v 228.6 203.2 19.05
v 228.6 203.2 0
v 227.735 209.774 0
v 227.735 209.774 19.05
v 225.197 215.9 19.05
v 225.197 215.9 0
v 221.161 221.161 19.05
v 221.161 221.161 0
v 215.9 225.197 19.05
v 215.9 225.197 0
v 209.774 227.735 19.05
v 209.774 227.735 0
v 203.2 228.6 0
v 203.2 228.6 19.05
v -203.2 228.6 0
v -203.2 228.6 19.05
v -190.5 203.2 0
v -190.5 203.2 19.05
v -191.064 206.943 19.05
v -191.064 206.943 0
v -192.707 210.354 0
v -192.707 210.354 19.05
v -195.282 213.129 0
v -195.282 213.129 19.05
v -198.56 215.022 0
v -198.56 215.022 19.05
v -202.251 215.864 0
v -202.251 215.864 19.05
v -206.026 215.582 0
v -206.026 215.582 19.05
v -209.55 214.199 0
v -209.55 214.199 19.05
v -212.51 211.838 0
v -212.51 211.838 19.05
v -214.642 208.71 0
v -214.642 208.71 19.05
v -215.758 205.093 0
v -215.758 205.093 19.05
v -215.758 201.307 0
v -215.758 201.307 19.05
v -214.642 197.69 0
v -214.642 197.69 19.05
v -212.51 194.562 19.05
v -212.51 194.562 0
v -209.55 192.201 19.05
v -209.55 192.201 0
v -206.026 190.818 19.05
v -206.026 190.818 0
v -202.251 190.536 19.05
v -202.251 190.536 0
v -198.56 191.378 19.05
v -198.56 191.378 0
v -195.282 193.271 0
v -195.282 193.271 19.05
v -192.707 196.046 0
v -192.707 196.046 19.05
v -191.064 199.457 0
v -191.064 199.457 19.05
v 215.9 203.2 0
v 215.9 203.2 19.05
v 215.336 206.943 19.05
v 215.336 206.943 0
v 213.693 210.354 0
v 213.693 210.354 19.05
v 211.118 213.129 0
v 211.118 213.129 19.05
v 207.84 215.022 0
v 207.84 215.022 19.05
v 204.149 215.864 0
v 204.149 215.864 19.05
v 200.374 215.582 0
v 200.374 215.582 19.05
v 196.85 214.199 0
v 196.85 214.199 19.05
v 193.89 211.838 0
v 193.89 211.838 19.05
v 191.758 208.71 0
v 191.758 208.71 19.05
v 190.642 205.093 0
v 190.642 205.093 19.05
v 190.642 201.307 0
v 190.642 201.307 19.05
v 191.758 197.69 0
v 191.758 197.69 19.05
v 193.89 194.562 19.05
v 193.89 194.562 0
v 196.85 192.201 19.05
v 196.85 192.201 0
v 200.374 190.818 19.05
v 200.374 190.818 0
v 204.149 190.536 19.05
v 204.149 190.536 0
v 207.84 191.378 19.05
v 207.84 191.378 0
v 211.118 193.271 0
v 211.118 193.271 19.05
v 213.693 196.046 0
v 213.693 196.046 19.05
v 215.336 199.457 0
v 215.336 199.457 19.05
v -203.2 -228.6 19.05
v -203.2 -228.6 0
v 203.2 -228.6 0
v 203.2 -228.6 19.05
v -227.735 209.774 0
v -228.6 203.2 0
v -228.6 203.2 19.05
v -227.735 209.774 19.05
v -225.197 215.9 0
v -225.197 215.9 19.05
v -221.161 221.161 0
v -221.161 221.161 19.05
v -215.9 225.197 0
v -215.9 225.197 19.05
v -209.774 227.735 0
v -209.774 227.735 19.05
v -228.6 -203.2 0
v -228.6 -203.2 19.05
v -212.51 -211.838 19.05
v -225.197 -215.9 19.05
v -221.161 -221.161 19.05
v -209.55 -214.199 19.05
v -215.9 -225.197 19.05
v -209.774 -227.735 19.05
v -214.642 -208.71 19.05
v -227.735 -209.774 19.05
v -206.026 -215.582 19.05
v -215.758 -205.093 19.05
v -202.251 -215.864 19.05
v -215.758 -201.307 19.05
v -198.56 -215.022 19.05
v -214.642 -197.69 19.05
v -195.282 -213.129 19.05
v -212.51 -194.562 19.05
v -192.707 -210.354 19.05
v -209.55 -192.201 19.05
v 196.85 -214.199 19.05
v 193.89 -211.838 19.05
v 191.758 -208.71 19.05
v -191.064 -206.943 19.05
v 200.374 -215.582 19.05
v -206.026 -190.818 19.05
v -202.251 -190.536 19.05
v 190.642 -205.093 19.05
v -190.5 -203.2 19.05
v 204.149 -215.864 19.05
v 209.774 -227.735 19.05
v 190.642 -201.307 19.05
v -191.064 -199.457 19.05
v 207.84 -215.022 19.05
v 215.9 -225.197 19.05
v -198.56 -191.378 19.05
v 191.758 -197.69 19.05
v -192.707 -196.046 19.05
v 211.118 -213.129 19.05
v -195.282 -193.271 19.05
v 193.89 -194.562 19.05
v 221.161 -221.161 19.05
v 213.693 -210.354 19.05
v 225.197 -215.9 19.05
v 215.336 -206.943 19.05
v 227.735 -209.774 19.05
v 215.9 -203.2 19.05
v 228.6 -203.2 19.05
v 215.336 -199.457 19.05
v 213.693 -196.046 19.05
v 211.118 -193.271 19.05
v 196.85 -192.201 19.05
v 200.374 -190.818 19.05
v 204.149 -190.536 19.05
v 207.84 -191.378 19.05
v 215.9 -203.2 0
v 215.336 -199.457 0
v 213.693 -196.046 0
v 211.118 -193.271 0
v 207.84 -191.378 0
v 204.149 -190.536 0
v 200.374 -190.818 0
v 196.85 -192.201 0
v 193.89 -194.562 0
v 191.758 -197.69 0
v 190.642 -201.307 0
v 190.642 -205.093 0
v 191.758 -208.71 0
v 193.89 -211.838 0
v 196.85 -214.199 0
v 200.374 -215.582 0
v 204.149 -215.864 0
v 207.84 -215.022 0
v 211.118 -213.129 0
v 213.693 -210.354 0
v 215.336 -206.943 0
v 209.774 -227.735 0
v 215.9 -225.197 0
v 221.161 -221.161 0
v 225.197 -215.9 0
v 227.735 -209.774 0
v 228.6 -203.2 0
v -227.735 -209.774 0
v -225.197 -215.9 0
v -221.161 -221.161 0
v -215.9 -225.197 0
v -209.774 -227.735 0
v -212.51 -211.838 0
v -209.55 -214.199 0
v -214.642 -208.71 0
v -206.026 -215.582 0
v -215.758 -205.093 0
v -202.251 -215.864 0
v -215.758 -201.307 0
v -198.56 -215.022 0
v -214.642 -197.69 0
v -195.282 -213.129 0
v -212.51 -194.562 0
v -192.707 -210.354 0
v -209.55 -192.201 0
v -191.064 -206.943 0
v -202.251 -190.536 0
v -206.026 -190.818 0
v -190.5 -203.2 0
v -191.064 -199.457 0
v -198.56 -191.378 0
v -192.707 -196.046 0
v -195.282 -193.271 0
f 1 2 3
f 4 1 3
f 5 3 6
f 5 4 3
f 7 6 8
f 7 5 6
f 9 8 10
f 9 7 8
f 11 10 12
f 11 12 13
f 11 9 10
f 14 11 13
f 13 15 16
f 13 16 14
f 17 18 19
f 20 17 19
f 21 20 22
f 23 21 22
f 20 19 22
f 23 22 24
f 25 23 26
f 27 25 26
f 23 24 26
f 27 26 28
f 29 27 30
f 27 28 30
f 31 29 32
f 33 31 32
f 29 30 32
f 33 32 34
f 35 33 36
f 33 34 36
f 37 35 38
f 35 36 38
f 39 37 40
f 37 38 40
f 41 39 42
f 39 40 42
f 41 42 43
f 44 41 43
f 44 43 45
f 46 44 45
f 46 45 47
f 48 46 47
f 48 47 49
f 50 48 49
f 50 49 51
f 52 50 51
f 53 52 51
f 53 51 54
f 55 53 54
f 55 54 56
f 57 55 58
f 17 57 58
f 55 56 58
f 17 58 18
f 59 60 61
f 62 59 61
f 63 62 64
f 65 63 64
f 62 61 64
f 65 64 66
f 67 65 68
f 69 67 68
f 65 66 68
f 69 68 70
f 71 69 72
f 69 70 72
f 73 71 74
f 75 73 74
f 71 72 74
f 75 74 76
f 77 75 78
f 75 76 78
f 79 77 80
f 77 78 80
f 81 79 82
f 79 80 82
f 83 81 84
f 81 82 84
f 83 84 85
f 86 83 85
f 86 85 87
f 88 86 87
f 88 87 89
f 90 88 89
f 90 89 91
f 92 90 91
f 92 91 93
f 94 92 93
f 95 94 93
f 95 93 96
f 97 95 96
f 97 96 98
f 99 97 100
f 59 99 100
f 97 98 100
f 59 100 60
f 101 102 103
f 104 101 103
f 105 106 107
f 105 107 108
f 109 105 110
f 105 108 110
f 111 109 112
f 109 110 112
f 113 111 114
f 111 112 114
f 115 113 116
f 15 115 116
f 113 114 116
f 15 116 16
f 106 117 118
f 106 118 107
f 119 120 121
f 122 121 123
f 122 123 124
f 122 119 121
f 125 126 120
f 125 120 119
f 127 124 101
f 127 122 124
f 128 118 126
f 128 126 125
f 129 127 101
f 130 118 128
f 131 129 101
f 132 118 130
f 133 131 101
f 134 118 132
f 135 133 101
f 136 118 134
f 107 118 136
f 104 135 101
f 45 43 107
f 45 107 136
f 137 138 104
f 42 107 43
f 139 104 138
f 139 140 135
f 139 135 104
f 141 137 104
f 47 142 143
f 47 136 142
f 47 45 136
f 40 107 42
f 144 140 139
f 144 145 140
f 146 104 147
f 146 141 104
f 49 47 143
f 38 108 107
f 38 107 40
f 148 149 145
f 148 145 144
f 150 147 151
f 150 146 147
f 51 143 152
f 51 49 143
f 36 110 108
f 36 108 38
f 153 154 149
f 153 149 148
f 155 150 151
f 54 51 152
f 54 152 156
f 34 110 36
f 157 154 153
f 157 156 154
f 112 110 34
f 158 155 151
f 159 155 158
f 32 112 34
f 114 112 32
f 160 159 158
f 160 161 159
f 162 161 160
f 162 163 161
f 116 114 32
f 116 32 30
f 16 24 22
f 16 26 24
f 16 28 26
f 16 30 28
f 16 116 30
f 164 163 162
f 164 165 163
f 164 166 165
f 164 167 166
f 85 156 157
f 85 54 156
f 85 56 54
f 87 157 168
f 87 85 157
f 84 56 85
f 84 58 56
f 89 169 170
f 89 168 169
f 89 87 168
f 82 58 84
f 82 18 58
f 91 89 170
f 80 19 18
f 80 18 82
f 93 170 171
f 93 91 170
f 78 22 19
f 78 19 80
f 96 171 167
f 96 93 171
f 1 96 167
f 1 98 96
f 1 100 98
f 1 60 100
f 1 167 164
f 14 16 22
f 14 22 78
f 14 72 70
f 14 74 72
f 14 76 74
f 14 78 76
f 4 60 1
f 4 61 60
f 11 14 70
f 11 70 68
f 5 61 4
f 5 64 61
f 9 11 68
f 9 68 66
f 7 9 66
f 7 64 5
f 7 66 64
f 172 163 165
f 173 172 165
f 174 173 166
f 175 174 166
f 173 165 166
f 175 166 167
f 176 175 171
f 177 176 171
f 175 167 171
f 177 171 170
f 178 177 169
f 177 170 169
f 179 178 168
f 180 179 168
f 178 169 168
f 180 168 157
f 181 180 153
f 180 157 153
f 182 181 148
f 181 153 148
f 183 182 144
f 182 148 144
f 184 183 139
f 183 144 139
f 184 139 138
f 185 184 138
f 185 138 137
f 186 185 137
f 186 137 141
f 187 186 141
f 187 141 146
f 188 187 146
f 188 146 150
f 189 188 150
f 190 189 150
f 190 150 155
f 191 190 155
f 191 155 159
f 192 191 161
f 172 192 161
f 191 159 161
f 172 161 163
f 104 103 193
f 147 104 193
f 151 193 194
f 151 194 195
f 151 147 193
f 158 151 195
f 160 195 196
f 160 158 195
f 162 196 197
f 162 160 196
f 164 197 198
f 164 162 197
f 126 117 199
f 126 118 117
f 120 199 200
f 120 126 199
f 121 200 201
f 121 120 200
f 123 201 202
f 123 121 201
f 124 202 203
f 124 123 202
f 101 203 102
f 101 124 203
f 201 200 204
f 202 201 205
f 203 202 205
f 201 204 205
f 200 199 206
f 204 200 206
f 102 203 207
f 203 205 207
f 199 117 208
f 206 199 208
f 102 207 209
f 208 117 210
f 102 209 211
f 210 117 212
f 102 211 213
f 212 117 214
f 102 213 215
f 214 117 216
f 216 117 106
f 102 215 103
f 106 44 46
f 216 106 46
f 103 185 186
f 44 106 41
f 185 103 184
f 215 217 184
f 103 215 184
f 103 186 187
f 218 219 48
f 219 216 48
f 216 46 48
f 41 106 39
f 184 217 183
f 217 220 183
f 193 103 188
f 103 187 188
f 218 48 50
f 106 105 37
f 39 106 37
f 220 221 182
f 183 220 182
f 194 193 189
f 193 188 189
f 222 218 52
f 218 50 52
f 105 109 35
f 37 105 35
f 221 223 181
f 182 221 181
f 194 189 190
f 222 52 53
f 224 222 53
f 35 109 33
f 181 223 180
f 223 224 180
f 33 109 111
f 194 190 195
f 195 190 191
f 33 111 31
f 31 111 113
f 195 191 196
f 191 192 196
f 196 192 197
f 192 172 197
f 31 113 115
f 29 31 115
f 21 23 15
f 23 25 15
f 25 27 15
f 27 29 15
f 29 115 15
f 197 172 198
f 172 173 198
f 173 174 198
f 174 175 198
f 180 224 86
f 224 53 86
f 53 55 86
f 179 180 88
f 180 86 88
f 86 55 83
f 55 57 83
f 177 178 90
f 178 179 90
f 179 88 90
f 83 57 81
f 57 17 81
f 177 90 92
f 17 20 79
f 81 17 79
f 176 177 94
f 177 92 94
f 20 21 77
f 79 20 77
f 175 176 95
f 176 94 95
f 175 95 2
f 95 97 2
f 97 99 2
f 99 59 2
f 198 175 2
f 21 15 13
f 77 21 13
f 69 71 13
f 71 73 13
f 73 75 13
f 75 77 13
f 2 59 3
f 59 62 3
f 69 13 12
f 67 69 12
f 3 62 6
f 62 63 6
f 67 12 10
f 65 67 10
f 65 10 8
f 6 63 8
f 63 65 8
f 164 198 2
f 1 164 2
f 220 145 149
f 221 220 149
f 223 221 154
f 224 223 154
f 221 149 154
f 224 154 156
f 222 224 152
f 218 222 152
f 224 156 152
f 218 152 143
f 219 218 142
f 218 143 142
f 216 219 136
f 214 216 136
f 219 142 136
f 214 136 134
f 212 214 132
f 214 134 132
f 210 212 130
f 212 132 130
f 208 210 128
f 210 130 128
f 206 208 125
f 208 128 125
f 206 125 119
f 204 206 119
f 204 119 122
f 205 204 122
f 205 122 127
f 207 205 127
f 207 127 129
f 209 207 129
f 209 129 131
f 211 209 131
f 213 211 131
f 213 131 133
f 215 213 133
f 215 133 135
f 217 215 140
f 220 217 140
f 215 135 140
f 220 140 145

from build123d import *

# Parameters (mm, degrees)
F0_W     = 457.2
F0_H     = 457.2
F1_DEPTH = 19.05
F2_R     = 25.4
F3_R     = 12.7
F4_DEPTH = 19.05


with BuildPart() as f1:
    # F0 (on Top) → F1 (new body)
    with BuildSketch(Plane.XY):
        Rectangle(F0_W, F0_H)
    extrude(amount=F1_DEPTH)

    # F2
    f2_edges = [f1.edges().sort_by_distance(p)[0] for p in [
        (228.6, -228.6, 9.525),
        (228.6, 228.6, 9.525),
        (-228.6, -228.6, 9.525),
        (-228.6, 228.6, 9.525),
    ]]
    fillet(f2_edges, radius=F2_R)

    # F3 (on face) → F4 (cut, through all)
    with BuildSketch(Plane.XY.offset(19.05)):
        with Locations((-203.2, 203.2)):
            Circle(F3_R)
        with Locations((203.2, 203.2)):
            Circle(F3_R)
        with Locations((203.2, -203.2)):
            Circle(F3_R)
        with Locations((-203.2, -203.2)):
            Circle(F3_R)
    extrude(amount=-F4_DEPTH, mode=Mode.SUBTRACT)


solid = f1.part
